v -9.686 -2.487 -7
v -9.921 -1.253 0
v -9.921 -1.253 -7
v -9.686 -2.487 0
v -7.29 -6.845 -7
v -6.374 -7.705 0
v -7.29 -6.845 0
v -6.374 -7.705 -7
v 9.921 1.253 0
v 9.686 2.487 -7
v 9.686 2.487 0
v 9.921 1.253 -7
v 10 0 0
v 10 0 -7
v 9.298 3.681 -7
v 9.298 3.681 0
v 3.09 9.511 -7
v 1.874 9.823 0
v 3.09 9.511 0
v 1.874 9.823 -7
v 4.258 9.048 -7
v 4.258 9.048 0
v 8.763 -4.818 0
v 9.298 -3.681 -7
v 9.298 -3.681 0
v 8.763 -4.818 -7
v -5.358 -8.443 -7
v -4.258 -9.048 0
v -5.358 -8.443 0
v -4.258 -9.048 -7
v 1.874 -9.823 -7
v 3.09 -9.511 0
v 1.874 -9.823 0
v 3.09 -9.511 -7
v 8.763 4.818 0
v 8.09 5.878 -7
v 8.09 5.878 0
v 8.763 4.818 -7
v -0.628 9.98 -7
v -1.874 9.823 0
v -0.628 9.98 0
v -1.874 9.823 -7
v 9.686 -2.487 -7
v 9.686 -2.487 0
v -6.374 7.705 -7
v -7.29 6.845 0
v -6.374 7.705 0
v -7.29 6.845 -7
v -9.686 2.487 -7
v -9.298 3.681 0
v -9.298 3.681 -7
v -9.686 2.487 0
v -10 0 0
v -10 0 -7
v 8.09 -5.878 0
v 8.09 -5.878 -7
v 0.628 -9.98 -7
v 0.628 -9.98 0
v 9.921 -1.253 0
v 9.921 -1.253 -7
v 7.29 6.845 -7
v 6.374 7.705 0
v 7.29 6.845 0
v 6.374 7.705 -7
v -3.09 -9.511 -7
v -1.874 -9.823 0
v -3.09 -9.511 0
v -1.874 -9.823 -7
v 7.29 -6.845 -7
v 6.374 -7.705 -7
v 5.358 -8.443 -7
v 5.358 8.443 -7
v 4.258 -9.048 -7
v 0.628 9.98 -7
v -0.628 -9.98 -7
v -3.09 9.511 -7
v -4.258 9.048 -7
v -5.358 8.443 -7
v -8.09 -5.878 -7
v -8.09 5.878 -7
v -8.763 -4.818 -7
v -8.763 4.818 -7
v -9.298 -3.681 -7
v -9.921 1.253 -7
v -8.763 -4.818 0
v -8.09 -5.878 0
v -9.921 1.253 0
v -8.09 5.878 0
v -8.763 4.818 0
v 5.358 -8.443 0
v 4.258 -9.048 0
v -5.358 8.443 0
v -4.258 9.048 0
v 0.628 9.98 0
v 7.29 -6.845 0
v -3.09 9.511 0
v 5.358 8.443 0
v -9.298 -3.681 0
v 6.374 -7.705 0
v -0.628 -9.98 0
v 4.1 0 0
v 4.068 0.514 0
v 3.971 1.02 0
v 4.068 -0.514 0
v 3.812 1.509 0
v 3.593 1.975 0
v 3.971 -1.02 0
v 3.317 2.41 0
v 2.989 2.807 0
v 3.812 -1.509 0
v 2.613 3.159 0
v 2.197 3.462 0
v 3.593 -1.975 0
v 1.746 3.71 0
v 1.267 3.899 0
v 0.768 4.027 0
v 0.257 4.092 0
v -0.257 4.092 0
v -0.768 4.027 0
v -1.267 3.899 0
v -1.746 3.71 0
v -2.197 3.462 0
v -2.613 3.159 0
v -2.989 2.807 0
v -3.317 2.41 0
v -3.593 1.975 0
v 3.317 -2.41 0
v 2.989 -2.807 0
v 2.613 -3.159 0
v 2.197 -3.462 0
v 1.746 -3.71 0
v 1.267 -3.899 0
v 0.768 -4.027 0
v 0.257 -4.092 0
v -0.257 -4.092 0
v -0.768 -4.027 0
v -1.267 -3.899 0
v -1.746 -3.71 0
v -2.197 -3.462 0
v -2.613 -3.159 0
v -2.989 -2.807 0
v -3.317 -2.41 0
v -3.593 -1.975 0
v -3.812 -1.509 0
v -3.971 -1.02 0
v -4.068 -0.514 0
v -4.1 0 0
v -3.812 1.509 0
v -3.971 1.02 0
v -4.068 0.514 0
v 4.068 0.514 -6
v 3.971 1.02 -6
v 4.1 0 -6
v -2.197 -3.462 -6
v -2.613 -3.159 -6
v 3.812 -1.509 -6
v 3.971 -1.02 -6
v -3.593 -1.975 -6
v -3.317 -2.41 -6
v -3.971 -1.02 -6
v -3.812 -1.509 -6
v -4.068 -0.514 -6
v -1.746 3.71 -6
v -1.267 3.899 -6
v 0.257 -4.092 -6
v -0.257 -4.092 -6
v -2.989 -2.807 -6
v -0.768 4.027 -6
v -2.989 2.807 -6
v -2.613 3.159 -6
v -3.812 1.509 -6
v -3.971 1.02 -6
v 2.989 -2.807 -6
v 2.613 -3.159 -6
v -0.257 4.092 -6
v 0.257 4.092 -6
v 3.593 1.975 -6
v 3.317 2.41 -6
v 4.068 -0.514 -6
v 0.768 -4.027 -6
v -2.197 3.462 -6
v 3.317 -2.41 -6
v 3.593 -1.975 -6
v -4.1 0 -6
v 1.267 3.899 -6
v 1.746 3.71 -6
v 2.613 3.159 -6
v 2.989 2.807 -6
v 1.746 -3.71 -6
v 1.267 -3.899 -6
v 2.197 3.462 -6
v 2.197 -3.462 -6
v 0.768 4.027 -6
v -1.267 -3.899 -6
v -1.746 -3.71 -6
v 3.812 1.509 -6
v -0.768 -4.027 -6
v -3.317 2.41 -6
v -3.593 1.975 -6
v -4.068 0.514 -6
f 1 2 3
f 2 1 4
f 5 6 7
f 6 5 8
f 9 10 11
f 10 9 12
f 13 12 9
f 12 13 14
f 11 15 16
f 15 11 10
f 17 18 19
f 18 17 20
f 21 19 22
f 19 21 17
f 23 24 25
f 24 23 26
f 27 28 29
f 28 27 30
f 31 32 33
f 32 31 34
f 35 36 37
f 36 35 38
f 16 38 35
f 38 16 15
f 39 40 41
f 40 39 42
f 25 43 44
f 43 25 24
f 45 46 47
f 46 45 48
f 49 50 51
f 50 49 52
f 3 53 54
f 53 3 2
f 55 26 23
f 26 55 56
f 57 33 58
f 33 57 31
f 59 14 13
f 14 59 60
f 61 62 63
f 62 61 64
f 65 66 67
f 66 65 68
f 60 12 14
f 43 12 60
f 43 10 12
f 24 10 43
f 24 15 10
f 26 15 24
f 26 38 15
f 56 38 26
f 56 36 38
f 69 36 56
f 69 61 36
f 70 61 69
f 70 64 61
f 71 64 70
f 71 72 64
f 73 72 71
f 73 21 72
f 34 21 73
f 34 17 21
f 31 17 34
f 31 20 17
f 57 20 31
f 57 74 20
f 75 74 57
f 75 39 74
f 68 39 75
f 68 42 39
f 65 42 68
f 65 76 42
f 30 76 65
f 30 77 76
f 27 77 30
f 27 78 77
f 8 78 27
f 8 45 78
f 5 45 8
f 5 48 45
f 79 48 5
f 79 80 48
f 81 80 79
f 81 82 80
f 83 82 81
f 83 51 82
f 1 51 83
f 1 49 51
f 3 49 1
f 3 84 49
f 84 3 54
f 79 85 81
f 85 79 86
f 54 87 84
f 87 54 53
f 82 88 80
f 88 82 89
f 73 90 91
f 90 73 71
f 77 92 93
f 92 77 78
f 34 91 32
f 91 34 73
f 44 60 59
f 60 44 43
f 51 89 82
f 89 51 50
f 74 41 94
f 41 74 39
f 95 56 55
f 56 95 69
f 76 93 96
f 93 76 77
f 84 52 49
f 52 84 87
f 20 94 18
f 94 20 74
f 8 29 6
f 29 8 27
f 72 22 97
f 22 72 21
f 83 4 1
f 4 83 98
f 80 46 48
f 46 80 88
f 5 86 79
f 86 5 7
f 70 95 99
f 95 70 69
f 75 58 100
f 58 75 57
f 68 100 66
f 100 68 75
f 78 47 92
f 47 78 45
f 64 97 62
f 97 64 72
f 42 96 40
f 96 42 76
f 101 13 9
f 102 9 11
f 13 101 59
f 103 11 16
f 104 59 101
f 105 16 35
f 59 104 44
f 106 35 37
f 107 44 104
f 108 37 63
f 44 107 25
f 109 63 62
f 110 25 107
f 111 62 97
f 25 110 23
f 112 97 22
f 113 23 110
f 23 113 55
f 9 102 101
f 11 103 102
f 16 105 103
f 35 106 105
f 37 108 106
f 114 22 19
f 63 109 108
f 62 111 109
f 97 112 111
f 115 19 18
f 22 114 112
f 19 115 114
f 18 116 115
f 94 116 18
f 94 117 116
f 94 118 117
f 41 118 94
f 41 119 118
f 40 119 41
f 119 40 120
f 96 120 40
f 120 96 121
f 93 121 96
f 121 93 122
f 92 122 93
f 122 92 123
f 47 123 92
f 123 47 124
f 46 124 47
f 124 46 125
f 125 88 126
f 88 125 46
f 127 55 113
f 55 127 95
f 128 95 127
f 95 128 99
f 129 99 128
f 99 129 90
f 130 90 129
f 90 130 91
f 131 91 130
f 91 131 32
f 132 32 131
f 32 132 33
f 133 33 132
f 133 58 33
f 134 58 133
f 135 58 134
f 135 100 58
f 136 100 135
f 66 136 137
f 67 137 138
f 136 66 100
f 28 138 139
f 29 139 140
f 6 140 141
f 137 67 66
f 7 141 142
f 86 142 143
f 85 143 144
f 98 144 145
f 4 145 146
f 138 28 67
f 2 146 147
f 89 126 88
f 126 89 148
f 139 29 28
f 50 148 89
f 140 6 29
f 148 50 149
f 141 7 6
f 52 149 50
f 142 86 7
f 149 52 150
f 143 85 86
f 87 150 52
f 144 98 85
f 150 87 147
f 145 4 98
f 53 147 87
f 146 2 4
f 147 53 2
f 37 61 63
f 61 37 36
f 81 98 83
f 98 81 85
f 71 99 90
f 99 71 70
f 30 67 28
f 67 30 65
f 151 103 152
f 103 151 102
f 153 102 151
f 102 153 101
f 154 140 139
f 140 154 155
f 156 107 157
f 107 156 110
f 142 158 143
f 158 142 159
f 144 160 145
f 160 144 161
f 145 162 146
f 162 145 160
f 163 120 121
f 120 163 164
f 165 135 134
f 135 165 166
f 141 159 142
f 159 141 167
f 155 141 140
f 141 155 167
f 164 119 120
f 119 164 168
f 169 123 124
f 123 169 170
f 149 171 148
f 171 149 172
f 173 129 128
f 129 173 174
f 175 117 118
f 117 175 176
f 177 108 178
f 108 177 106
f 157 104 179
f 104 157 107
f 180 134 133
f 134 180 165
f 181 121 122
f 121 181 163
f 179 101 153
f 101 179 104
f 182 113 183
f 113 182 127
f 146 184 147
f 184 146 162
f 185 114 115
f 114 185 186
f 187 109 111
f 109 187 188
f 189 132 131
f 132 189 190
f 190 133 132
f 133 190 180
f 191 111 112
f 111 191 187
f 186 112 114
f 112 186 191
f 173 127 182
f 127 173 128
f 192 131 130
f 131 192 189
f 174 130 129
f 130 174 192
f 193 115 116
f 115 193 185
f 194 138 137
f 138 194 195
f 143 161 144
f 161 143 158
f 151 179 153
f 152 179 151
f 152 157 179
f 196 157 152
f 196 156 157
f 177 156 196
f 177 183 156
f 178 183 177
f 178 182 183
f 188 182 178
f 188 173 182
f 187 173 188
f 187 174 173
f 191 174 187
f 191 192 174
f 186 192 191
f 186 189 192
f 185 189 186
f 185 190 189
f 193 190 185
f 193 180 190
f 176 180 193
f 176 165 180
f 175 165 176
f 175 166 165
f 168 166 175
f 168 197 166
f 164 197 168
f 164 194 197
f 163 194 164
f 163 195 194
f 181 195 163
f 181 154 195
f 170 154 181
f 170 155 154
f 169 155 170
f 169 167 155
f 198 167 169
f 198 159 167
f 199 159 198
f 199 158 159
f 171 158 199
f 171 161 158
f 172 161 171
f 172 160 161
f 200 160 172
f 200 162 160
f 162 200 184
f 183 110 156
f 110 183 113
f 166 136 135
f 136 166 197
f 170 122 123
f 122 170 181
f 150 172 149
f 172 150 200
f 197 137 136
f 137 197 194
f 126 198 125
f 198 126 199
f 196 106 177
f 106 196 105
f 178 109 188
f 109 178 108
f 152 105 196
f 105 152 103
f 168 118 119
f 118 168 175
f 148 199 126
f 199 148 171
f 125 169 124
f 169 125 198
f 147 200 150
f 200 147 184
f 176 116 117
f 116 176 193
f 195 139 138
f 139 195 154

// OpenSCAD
$fn = 50;


difference() {
	union() {
		translate(v = [0, 0, -7.0000000000]) {
			cylinder(h = 7, r = 10.0000000000);
		}
	}
	union() {
		#translate(v = [0, 0, -6.0000000000]) {
			cylinder(h = 6, r = 4.1000000000);
		}
	}
}
